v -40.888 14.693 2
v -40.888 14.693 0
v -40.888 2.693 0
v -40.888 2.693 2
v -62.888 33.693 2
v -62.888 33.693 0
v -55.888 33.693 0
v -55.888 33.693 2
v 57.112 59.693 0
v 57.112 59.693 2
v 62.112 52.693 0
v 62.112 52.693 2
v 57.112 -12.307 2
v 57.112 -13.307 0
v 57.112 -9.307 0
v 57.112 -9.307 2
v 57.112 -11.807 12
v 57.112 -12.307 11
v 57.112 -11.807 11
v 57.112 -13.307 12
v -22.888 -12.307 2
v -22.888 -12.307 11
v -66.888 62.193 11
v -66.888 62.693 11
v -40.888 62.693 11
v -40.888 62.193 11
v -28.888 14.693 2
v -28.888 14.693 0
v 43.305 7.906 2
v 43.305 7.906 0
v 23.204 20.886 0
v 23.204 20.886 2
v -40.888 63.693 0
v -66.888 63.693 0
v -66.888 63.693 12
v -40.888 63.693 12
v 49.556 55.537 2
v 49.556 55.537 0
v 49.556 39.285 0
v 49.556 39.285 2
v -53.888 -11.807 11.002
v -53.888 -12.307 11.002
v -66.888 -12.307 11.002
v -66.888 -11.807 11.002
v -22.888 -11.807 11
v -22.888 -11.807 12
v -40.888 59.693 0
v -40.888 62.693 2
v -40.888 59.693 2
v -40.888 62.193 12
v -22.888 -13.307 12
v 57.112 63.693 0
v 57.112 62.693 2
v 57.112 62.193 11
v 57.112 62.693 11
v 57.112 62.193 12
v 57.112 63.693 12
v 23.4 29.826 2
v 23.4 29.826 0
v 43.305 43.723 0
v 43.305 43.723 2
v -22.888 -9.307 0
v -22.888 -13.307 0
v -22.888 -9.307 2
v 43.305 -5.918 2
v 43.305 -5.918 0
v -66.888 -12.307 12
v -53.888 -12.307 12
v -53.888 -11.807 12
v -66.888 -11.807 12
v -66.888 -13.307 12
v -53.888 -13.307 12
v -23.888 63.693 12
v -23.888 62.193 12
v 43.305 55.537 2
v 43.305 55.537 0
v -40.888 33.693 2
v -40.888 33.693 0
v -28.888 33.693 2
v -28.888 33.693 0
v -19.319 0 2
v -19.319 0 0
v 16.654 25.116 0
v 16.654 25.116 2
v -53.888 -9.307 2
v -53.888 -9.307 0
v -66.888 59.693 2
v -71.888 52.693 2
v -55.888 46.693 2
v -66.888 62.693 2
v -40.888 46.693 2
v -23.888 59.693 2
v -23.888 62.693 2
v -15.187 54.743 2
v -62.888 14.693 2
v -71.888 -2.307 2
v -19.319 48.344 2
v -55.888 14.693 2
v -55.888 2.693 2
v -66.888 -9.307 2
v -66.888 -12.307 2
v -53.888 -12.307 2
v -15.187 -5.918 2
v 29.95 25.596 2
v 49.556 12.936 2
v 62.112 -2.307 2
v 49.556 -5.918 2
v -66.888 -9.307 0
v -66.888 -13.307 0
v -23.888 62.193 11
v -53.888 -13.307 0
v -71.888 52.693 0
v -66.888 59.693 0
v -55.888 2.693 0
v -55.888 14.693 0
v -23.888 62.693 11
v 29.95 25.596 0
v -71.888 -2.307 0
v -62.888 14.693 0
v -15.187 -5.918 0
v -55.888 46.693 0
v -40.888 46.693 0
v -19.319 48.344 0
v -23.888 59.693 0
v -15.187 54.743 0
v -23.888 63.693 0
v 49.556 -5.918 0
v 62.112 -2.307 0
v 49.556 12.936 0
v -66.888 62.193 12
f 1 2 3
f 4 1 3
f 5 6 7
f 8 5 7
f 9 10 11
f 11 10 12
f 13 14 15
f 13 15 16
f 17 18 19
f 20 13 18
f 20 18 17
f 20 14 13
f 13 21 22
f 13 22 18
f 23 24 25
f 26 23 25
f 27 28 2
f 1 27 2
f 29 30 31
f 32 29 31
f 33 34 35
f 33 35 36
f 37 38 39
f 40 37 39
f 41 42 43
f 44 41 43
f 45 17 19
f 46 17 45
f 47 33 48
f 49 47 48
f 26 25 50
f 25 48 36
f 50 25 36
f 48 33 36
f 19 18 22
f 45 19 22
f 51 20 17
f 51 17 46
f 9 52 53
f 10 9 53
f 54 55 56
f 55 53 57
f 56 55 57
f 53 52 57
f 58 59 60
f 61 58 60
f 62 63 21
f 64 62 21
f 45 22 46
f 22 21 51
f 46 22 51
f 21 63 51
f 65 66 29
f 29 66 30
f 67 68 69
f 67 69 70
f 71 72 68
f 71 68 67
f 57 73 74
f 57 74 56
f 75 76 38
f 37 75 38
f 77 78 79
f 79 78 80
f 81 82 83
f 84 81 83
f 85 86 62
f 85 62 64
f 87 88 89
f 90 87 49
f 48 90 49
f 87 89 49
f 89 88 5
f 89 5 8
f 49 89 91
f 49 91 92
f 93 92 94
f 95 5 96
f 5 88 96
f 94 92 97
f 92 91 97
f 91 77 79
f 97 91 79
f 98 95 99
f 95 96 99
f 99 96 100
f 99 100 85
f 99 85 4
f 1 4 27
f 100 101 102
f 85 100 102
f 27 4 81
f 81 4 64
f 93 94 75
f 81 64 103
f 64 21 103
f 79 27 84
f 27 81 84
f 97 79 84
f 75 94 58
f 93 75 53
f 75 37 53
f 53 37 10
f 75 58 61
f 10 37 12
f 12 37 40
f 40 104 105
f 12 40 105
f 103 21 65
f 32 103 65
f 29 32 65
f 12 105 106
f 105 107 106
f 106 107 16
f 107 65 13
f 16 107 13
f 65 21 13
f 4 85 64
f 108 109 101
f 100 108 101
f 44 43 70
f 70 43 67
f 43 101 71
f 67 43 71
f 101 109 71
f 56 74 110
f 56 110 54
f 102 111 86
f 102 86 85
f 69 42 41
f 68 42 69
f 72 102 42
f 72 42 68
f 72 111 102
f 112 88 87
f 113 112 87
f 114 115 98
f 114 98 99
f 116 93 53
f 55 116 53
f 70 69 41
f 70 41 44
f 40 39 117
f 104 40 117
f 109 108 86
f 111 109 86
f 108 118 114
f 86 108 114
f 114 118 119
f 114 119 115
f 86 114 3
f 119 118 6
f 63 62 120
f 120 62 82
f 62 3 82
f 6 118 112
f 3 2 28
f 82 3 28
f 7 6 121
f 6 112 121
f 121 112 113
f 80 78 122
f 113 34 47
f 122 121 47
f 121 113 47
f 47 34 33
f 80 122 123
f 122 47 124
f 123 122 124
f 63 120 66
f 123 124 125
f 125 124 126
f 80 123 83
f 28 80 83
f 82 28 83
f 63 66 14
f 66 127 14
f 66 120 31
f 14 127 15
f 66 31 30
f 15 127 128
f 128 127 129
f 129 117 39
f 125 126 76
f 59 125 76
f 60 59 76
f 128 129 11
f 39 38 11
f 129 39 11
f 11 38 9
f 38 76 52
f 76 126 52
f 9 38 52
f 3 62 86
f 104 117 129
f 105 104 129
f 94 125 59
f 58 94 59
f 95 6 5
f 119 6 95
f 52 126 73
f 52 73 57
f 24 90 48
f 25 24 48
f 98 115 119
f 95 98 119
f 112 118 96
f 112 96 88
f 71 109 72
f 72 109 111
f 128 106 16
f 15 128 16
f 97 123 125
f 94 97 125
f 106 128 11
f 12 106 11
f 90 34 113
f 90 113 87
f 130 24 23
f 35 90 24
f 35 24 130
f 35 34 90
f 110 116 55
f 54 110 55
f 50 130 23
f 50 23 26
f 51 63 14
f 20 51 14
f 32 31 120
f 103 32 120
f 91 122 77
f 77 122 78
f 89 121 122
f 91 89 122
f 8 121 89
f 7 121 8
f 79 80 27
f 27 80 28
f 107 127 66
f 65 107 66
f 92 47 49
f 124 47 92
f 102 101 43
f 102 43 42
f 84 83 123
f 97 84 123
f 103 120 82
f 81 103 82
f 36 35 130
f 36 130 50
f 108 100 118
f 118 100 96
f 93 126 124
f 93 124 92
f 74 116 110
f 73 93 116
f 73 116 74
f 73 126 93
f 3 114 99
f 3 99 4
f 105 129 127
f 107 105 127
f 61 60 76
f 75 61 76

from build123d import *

# Parameters (mm, degrees)
F0_W      = 134
F0_H      = 69
F1_DEPTH  = 2
F2_W      = 81
F2_H      = 2
F3_DEPTH  = 4
F4_W      = 81
F4_H      = 4
F5_DEPTH  = 3
F6_DEPTH  = 7
F7_DEPTH  = 3
F8_W      = 81
F8_H      = 1
F9_DEPTH  = 0.5
F10_DEPTH = 1
F11_W     = 13
F11_H     = 2
F12_DEPTH = 4
F13_W     = 13
F13_H     = 4
F14_DEPTH = 10
F15_DEPTH = 3
F16_W     = 13
F16_H     = 0.9976745471
F17_DEPTH = 0.5
F18_W     = 81
F18_H     = 2
F19_DEPTH = 4
F20_W     = 81
F20_H     = 4
F21_DEPTH = 10
F22_DEPTH = 3
F23_W     = 81
F23_H     = 1
F24_DEPTH = 0.5
F25_W     = 26
F25_H     = 2
F26_DEPTH = 4
F27_W     = 26
F27_H     = 4
F28_DEPTH = 10
F29_DEPTH = 3
F30_W     = 26
F30_H     = 1
F31_DEPTH = 0.5
F33_DEPTH = 2.001
F34_W     = 15
F34_H     = 44
F35_DEPTH = 12.001
F36_W     = 7
F36_H     = 19
F36_W_2   = 15
F36_W_3   = 12
F37_DEPTH = 12.001
F40_DEPTH = 12.001


with BuildPart() as f1:
    # F0 (on Top) → F1 (new body)
    with BuildSketch(Plane.XY):
        with Locations((-4.8879205883, 25.1932881936)):
            Rectangle(F0_W, F0_H)
    extrude(amount=F1_DEPTH)

    # F2 (on face) → F3 (join)
    with BuildSketch(Plane.XZ.offset(9.3067118064)):
        with Locations((16.6120794117, 1)):
            Rectangle(F2_W, F2_H)
    extrude(amount=F3_DEPTH)

    # F4 (on face) → F5 (join)
    with BuildSketch(Plane.XY.offset(2)):
        with Locations((16.6120794117, -11.3067118064)):
            Rectangle(F4_W, F4_H)
    extrude(amount=F5_DEPTH)

    # F6 (add): a face of the model
    f6_faces = [f1.faces().sort_by_distance(p)[0] for p in [
        (16.6120794117, -11.3067118064, 5),
    ]]
    extrude(f6_faces, amount=F6_DEPTH)

    # F7 (cut): a face of the model
    f7_faces = [f1.faces().sort_by_distance(p)[0] for p in [
        (16.6120794117, -9.3067118064, 7),
    ]]
    extrude(f7_faces, amount=-F7_DEPTH, mode=Mode.SUBTRACT)

    # F8 (on face) → F9 (join)
    with BuildSketch(Plane(origin=(0, -12.3067118064, 0), x_dir=(-1, 0, 0), z_dir=(0, 1, 0))):
        with Locations((-16.6120794117, 11.5)):
            Rectangle(F8_W, F8_H)
    extrude(amount=F9_DEPTH)

    # F10 (cut): a face of the model
    f10_faces = [f1.faces().sort_by_distance(p)[0] for p in [
        (-23.8879205883, -11.3067118064, 0.1264911064),
    ]]
    extrude(f10_faces, amount=-F10_DEPTH, mode=Mode.SUBTRACT)

    # F11 (on face) → F12 (join)
    with BuildSketch(Plane.XZ.offset(9.3067118064)):
        with Locations((-60.3879205883, 1)):
            Rectangle(F11_W, F11_H)
    extrude(amount=F12_DEPTH)

    # F13 (on face) → F14 (join)
    with BuildSketch(Plane.XY.offset(2)):
        with Locations((-60.3879205883, -11.3067118064)):
            Rectangle(F13_W, F13_H)
    extrude(amount=F14_DEPTH)

    # F15 (cut): a face of the model
    f15_faces = [f1.faces().sort_by_distance(p)[0] for p in [
        (-60.3879205883, -9.3067118064, 7),
    ]]
    extrude(f15_faces, amount=-F15_DEPTH, mode=Mode.SUBTRACT)

    # F16 (on face) → F17 (join)
    with BuildSketch(Plane(origin=(0, -12.3067118064, 0), x_dir=(-1, 0, 0), z_dir=(0, 1, 0))):
        with Locations((60.3879205883, 11.5011627264)):
            Rectangle(F16_W, F16_H)
    extrude(amount=F17_DEPTH)

    # F18 (on face) → F19 (join)
    with BuildSketch(Plane(origin=(0, 59.6932881936, 0), x_dir=(-1, 0, 0), z_dir=(0, 1, 0))):
        with Locations((-16.6120794117, 1)):
            Rectangle(F18_W, F18_H)
    extrude(amount=F19_DEPTH)

    # F20 (on face) → F21 (join)
    with BuildSketch(Plane.XY.offset(2)):
        with Locations((16.6120794117, 61.6932881936)):
            Rectangle(F20_W, F20_H)
    extrude(amount=F21_DEPTH)

    # F22 (cut): a face of the model
    f22_faces = [f1.faces().sort_by_distance(p)[0] for p in [
        (16.6120794117, 59.6932881936, 7),
    ]]
    extrude(f22_faces, amount=-F22_DEPTH, mode=Mode.SUBTRACT)

    # F23 (on face) → F24 (join)
    with BuildSketch(Plane.XZ.offset(-62.6932881936)):
        with Locations((16.6120794117, 11.5)):
            Rectangle(F23_W, F23_H)
    extrude(amount=F24_DEPTH)

    # F25 (on face) → F26 (join)
    with BuildSketch(Plane(origin=(0, 59.6932881936, 0), x_dir=(-1, 0, 0), z_dir=(0, 1, 0))):
        with Locations((53.8879205883, 1)):
            Rectangle(F25_W, F25_H)
    extrude(amount=F26_DEPTH)

    # F27 (on face) → F28 (join)
    with BuildSketch(Plane.XY.offset(2)):
        with Locations((-53.8879205883, 61.6932881936)):
            Rectangle(F27_W, F27_H)
    extrude(amount=F28_DEPTH)

    # F29 (cut): a face of the model
    f29_faces = [f1.faces().sort_by_distance(p)[0] for p in [
        (-53.8879205883, 59.6932881936, 7),
    ]]
    extrude(f29_faces, amount=-F29_DEPTH, mode=Mode.SUBTRACT)

    # F30 (on face) → F31 (join)
    with BuildSketch(Plane.XZ.offset(-62.6932881936)):
        with Locations((-53.8879205883, 11.5)):
            Rectangle(F30_W, F30_H)
    extrude(amount=F31_DEPTH)

    # F32 (on face) → F33 (cut, through all)
    with BuildSketch(Plane.XY.offset(2)):
        Polygon((-71.8879205883, 52.6932881936), (-66.8879205883, 59.6932881936), (-71.8879205883, 59.6932881936), align=None)
        Polygon((-66.8879205883, -9.3067118064), (-71.8879205883, -2.3067118064), (-71.8879205883, -9.3067118064), align=None)
        Polygon((62.1120794117, -9.3067118064), (62.1120794117, -2.3067118064), (57.1120794117, -9.3067118064), align=None)
        Polygon((62.1120794117, 59.6932881936), (57.1120794117, 59.6932881936), (62.1120794117, 52.6932881936), align=None)
    extrude(amount=-F33_DEPTH, mode=Mode.SUBTRACT)

    # F34 (on face) → F35 (cut, through all)
    with BuildSketch(Plane(origin=(0, 0, 0), x_dir=(1, 0, 0), z_dir=(0, 0, -1))):
        with Locations((-48.3879205883, -24.6932881936)):
            Rectangle(F34_W, F34_H)
    extrude(amount=-F35_DEPTH, mode=Mode.SUBTRACT)

    # F36 (on face) → F37 (cut, through all)
    with BuildSketch(Plane(origin=(0, 0, 0), x_dir=(1, 0, 0), z_dir=(0, 0, -1))):
        with Locations((-59.3879205883, -24.1932881936)):
            Rectangle(F36_W, F36_H)
        with Locations((-48.3879205883, -24.1932881936)):
            Rectangle(F36_W_2, F36_H)
        with Locations((-34.8879205883, -24.1932881936)):
            Rectangle(F36_W_3, F36_H)
    extrude(amount=-F37_DEPTH, mode=Mode.SUBTRACT)

    # F39 (on face) → F40 (cut, through all)
    with BuildSketch(Plane(origin=(0, 0, 0), x_dir=(1, 0, 0), z_dir=(0, 0, -1))):
        Polygon((43.3054530231, -55.5370226502), (49.5563223958, -55.5370226502), (49.5563223958, -39.2849373539), (29.9500417569, -25.5961895548), (23.4002765373, -29.8256016073), (43.3054530231, -43.723033039), align=None)
        Polygon((23.4002765373, -29.8256016073), (29.9500417569, -25.5961895548), (23.2038749613, -20.8861388534), (16.6541097417, -25.1155509059), align=None)
        Polygon((23.2038749613, -20.8861388534), (29.9500417569, -25.5961895548), (49.5563223958, -12.9357296973), (49.5563223958, 5.9177065827), (43.3054530231, 5.9177065827), (43.3054530231, -7.9058481593), align=None)
        Polygon((16.6541097417, -25.1155509059), (23.2038749613, -20.8861388534), (-15.187051918, 5.9177065827), (-19.3186867982, 0), align=None)
        Polygon((-15.187051918, -54.7427866621), (23.4002765373, -29.8256016073), (16.6541097417, -25.1155509059), (-19.3186867982, -48.3444414305), align=None)
    extrude(amount=-F40_DEPTH, mode=Mode.SUBTRACT)


solid = f1.part
